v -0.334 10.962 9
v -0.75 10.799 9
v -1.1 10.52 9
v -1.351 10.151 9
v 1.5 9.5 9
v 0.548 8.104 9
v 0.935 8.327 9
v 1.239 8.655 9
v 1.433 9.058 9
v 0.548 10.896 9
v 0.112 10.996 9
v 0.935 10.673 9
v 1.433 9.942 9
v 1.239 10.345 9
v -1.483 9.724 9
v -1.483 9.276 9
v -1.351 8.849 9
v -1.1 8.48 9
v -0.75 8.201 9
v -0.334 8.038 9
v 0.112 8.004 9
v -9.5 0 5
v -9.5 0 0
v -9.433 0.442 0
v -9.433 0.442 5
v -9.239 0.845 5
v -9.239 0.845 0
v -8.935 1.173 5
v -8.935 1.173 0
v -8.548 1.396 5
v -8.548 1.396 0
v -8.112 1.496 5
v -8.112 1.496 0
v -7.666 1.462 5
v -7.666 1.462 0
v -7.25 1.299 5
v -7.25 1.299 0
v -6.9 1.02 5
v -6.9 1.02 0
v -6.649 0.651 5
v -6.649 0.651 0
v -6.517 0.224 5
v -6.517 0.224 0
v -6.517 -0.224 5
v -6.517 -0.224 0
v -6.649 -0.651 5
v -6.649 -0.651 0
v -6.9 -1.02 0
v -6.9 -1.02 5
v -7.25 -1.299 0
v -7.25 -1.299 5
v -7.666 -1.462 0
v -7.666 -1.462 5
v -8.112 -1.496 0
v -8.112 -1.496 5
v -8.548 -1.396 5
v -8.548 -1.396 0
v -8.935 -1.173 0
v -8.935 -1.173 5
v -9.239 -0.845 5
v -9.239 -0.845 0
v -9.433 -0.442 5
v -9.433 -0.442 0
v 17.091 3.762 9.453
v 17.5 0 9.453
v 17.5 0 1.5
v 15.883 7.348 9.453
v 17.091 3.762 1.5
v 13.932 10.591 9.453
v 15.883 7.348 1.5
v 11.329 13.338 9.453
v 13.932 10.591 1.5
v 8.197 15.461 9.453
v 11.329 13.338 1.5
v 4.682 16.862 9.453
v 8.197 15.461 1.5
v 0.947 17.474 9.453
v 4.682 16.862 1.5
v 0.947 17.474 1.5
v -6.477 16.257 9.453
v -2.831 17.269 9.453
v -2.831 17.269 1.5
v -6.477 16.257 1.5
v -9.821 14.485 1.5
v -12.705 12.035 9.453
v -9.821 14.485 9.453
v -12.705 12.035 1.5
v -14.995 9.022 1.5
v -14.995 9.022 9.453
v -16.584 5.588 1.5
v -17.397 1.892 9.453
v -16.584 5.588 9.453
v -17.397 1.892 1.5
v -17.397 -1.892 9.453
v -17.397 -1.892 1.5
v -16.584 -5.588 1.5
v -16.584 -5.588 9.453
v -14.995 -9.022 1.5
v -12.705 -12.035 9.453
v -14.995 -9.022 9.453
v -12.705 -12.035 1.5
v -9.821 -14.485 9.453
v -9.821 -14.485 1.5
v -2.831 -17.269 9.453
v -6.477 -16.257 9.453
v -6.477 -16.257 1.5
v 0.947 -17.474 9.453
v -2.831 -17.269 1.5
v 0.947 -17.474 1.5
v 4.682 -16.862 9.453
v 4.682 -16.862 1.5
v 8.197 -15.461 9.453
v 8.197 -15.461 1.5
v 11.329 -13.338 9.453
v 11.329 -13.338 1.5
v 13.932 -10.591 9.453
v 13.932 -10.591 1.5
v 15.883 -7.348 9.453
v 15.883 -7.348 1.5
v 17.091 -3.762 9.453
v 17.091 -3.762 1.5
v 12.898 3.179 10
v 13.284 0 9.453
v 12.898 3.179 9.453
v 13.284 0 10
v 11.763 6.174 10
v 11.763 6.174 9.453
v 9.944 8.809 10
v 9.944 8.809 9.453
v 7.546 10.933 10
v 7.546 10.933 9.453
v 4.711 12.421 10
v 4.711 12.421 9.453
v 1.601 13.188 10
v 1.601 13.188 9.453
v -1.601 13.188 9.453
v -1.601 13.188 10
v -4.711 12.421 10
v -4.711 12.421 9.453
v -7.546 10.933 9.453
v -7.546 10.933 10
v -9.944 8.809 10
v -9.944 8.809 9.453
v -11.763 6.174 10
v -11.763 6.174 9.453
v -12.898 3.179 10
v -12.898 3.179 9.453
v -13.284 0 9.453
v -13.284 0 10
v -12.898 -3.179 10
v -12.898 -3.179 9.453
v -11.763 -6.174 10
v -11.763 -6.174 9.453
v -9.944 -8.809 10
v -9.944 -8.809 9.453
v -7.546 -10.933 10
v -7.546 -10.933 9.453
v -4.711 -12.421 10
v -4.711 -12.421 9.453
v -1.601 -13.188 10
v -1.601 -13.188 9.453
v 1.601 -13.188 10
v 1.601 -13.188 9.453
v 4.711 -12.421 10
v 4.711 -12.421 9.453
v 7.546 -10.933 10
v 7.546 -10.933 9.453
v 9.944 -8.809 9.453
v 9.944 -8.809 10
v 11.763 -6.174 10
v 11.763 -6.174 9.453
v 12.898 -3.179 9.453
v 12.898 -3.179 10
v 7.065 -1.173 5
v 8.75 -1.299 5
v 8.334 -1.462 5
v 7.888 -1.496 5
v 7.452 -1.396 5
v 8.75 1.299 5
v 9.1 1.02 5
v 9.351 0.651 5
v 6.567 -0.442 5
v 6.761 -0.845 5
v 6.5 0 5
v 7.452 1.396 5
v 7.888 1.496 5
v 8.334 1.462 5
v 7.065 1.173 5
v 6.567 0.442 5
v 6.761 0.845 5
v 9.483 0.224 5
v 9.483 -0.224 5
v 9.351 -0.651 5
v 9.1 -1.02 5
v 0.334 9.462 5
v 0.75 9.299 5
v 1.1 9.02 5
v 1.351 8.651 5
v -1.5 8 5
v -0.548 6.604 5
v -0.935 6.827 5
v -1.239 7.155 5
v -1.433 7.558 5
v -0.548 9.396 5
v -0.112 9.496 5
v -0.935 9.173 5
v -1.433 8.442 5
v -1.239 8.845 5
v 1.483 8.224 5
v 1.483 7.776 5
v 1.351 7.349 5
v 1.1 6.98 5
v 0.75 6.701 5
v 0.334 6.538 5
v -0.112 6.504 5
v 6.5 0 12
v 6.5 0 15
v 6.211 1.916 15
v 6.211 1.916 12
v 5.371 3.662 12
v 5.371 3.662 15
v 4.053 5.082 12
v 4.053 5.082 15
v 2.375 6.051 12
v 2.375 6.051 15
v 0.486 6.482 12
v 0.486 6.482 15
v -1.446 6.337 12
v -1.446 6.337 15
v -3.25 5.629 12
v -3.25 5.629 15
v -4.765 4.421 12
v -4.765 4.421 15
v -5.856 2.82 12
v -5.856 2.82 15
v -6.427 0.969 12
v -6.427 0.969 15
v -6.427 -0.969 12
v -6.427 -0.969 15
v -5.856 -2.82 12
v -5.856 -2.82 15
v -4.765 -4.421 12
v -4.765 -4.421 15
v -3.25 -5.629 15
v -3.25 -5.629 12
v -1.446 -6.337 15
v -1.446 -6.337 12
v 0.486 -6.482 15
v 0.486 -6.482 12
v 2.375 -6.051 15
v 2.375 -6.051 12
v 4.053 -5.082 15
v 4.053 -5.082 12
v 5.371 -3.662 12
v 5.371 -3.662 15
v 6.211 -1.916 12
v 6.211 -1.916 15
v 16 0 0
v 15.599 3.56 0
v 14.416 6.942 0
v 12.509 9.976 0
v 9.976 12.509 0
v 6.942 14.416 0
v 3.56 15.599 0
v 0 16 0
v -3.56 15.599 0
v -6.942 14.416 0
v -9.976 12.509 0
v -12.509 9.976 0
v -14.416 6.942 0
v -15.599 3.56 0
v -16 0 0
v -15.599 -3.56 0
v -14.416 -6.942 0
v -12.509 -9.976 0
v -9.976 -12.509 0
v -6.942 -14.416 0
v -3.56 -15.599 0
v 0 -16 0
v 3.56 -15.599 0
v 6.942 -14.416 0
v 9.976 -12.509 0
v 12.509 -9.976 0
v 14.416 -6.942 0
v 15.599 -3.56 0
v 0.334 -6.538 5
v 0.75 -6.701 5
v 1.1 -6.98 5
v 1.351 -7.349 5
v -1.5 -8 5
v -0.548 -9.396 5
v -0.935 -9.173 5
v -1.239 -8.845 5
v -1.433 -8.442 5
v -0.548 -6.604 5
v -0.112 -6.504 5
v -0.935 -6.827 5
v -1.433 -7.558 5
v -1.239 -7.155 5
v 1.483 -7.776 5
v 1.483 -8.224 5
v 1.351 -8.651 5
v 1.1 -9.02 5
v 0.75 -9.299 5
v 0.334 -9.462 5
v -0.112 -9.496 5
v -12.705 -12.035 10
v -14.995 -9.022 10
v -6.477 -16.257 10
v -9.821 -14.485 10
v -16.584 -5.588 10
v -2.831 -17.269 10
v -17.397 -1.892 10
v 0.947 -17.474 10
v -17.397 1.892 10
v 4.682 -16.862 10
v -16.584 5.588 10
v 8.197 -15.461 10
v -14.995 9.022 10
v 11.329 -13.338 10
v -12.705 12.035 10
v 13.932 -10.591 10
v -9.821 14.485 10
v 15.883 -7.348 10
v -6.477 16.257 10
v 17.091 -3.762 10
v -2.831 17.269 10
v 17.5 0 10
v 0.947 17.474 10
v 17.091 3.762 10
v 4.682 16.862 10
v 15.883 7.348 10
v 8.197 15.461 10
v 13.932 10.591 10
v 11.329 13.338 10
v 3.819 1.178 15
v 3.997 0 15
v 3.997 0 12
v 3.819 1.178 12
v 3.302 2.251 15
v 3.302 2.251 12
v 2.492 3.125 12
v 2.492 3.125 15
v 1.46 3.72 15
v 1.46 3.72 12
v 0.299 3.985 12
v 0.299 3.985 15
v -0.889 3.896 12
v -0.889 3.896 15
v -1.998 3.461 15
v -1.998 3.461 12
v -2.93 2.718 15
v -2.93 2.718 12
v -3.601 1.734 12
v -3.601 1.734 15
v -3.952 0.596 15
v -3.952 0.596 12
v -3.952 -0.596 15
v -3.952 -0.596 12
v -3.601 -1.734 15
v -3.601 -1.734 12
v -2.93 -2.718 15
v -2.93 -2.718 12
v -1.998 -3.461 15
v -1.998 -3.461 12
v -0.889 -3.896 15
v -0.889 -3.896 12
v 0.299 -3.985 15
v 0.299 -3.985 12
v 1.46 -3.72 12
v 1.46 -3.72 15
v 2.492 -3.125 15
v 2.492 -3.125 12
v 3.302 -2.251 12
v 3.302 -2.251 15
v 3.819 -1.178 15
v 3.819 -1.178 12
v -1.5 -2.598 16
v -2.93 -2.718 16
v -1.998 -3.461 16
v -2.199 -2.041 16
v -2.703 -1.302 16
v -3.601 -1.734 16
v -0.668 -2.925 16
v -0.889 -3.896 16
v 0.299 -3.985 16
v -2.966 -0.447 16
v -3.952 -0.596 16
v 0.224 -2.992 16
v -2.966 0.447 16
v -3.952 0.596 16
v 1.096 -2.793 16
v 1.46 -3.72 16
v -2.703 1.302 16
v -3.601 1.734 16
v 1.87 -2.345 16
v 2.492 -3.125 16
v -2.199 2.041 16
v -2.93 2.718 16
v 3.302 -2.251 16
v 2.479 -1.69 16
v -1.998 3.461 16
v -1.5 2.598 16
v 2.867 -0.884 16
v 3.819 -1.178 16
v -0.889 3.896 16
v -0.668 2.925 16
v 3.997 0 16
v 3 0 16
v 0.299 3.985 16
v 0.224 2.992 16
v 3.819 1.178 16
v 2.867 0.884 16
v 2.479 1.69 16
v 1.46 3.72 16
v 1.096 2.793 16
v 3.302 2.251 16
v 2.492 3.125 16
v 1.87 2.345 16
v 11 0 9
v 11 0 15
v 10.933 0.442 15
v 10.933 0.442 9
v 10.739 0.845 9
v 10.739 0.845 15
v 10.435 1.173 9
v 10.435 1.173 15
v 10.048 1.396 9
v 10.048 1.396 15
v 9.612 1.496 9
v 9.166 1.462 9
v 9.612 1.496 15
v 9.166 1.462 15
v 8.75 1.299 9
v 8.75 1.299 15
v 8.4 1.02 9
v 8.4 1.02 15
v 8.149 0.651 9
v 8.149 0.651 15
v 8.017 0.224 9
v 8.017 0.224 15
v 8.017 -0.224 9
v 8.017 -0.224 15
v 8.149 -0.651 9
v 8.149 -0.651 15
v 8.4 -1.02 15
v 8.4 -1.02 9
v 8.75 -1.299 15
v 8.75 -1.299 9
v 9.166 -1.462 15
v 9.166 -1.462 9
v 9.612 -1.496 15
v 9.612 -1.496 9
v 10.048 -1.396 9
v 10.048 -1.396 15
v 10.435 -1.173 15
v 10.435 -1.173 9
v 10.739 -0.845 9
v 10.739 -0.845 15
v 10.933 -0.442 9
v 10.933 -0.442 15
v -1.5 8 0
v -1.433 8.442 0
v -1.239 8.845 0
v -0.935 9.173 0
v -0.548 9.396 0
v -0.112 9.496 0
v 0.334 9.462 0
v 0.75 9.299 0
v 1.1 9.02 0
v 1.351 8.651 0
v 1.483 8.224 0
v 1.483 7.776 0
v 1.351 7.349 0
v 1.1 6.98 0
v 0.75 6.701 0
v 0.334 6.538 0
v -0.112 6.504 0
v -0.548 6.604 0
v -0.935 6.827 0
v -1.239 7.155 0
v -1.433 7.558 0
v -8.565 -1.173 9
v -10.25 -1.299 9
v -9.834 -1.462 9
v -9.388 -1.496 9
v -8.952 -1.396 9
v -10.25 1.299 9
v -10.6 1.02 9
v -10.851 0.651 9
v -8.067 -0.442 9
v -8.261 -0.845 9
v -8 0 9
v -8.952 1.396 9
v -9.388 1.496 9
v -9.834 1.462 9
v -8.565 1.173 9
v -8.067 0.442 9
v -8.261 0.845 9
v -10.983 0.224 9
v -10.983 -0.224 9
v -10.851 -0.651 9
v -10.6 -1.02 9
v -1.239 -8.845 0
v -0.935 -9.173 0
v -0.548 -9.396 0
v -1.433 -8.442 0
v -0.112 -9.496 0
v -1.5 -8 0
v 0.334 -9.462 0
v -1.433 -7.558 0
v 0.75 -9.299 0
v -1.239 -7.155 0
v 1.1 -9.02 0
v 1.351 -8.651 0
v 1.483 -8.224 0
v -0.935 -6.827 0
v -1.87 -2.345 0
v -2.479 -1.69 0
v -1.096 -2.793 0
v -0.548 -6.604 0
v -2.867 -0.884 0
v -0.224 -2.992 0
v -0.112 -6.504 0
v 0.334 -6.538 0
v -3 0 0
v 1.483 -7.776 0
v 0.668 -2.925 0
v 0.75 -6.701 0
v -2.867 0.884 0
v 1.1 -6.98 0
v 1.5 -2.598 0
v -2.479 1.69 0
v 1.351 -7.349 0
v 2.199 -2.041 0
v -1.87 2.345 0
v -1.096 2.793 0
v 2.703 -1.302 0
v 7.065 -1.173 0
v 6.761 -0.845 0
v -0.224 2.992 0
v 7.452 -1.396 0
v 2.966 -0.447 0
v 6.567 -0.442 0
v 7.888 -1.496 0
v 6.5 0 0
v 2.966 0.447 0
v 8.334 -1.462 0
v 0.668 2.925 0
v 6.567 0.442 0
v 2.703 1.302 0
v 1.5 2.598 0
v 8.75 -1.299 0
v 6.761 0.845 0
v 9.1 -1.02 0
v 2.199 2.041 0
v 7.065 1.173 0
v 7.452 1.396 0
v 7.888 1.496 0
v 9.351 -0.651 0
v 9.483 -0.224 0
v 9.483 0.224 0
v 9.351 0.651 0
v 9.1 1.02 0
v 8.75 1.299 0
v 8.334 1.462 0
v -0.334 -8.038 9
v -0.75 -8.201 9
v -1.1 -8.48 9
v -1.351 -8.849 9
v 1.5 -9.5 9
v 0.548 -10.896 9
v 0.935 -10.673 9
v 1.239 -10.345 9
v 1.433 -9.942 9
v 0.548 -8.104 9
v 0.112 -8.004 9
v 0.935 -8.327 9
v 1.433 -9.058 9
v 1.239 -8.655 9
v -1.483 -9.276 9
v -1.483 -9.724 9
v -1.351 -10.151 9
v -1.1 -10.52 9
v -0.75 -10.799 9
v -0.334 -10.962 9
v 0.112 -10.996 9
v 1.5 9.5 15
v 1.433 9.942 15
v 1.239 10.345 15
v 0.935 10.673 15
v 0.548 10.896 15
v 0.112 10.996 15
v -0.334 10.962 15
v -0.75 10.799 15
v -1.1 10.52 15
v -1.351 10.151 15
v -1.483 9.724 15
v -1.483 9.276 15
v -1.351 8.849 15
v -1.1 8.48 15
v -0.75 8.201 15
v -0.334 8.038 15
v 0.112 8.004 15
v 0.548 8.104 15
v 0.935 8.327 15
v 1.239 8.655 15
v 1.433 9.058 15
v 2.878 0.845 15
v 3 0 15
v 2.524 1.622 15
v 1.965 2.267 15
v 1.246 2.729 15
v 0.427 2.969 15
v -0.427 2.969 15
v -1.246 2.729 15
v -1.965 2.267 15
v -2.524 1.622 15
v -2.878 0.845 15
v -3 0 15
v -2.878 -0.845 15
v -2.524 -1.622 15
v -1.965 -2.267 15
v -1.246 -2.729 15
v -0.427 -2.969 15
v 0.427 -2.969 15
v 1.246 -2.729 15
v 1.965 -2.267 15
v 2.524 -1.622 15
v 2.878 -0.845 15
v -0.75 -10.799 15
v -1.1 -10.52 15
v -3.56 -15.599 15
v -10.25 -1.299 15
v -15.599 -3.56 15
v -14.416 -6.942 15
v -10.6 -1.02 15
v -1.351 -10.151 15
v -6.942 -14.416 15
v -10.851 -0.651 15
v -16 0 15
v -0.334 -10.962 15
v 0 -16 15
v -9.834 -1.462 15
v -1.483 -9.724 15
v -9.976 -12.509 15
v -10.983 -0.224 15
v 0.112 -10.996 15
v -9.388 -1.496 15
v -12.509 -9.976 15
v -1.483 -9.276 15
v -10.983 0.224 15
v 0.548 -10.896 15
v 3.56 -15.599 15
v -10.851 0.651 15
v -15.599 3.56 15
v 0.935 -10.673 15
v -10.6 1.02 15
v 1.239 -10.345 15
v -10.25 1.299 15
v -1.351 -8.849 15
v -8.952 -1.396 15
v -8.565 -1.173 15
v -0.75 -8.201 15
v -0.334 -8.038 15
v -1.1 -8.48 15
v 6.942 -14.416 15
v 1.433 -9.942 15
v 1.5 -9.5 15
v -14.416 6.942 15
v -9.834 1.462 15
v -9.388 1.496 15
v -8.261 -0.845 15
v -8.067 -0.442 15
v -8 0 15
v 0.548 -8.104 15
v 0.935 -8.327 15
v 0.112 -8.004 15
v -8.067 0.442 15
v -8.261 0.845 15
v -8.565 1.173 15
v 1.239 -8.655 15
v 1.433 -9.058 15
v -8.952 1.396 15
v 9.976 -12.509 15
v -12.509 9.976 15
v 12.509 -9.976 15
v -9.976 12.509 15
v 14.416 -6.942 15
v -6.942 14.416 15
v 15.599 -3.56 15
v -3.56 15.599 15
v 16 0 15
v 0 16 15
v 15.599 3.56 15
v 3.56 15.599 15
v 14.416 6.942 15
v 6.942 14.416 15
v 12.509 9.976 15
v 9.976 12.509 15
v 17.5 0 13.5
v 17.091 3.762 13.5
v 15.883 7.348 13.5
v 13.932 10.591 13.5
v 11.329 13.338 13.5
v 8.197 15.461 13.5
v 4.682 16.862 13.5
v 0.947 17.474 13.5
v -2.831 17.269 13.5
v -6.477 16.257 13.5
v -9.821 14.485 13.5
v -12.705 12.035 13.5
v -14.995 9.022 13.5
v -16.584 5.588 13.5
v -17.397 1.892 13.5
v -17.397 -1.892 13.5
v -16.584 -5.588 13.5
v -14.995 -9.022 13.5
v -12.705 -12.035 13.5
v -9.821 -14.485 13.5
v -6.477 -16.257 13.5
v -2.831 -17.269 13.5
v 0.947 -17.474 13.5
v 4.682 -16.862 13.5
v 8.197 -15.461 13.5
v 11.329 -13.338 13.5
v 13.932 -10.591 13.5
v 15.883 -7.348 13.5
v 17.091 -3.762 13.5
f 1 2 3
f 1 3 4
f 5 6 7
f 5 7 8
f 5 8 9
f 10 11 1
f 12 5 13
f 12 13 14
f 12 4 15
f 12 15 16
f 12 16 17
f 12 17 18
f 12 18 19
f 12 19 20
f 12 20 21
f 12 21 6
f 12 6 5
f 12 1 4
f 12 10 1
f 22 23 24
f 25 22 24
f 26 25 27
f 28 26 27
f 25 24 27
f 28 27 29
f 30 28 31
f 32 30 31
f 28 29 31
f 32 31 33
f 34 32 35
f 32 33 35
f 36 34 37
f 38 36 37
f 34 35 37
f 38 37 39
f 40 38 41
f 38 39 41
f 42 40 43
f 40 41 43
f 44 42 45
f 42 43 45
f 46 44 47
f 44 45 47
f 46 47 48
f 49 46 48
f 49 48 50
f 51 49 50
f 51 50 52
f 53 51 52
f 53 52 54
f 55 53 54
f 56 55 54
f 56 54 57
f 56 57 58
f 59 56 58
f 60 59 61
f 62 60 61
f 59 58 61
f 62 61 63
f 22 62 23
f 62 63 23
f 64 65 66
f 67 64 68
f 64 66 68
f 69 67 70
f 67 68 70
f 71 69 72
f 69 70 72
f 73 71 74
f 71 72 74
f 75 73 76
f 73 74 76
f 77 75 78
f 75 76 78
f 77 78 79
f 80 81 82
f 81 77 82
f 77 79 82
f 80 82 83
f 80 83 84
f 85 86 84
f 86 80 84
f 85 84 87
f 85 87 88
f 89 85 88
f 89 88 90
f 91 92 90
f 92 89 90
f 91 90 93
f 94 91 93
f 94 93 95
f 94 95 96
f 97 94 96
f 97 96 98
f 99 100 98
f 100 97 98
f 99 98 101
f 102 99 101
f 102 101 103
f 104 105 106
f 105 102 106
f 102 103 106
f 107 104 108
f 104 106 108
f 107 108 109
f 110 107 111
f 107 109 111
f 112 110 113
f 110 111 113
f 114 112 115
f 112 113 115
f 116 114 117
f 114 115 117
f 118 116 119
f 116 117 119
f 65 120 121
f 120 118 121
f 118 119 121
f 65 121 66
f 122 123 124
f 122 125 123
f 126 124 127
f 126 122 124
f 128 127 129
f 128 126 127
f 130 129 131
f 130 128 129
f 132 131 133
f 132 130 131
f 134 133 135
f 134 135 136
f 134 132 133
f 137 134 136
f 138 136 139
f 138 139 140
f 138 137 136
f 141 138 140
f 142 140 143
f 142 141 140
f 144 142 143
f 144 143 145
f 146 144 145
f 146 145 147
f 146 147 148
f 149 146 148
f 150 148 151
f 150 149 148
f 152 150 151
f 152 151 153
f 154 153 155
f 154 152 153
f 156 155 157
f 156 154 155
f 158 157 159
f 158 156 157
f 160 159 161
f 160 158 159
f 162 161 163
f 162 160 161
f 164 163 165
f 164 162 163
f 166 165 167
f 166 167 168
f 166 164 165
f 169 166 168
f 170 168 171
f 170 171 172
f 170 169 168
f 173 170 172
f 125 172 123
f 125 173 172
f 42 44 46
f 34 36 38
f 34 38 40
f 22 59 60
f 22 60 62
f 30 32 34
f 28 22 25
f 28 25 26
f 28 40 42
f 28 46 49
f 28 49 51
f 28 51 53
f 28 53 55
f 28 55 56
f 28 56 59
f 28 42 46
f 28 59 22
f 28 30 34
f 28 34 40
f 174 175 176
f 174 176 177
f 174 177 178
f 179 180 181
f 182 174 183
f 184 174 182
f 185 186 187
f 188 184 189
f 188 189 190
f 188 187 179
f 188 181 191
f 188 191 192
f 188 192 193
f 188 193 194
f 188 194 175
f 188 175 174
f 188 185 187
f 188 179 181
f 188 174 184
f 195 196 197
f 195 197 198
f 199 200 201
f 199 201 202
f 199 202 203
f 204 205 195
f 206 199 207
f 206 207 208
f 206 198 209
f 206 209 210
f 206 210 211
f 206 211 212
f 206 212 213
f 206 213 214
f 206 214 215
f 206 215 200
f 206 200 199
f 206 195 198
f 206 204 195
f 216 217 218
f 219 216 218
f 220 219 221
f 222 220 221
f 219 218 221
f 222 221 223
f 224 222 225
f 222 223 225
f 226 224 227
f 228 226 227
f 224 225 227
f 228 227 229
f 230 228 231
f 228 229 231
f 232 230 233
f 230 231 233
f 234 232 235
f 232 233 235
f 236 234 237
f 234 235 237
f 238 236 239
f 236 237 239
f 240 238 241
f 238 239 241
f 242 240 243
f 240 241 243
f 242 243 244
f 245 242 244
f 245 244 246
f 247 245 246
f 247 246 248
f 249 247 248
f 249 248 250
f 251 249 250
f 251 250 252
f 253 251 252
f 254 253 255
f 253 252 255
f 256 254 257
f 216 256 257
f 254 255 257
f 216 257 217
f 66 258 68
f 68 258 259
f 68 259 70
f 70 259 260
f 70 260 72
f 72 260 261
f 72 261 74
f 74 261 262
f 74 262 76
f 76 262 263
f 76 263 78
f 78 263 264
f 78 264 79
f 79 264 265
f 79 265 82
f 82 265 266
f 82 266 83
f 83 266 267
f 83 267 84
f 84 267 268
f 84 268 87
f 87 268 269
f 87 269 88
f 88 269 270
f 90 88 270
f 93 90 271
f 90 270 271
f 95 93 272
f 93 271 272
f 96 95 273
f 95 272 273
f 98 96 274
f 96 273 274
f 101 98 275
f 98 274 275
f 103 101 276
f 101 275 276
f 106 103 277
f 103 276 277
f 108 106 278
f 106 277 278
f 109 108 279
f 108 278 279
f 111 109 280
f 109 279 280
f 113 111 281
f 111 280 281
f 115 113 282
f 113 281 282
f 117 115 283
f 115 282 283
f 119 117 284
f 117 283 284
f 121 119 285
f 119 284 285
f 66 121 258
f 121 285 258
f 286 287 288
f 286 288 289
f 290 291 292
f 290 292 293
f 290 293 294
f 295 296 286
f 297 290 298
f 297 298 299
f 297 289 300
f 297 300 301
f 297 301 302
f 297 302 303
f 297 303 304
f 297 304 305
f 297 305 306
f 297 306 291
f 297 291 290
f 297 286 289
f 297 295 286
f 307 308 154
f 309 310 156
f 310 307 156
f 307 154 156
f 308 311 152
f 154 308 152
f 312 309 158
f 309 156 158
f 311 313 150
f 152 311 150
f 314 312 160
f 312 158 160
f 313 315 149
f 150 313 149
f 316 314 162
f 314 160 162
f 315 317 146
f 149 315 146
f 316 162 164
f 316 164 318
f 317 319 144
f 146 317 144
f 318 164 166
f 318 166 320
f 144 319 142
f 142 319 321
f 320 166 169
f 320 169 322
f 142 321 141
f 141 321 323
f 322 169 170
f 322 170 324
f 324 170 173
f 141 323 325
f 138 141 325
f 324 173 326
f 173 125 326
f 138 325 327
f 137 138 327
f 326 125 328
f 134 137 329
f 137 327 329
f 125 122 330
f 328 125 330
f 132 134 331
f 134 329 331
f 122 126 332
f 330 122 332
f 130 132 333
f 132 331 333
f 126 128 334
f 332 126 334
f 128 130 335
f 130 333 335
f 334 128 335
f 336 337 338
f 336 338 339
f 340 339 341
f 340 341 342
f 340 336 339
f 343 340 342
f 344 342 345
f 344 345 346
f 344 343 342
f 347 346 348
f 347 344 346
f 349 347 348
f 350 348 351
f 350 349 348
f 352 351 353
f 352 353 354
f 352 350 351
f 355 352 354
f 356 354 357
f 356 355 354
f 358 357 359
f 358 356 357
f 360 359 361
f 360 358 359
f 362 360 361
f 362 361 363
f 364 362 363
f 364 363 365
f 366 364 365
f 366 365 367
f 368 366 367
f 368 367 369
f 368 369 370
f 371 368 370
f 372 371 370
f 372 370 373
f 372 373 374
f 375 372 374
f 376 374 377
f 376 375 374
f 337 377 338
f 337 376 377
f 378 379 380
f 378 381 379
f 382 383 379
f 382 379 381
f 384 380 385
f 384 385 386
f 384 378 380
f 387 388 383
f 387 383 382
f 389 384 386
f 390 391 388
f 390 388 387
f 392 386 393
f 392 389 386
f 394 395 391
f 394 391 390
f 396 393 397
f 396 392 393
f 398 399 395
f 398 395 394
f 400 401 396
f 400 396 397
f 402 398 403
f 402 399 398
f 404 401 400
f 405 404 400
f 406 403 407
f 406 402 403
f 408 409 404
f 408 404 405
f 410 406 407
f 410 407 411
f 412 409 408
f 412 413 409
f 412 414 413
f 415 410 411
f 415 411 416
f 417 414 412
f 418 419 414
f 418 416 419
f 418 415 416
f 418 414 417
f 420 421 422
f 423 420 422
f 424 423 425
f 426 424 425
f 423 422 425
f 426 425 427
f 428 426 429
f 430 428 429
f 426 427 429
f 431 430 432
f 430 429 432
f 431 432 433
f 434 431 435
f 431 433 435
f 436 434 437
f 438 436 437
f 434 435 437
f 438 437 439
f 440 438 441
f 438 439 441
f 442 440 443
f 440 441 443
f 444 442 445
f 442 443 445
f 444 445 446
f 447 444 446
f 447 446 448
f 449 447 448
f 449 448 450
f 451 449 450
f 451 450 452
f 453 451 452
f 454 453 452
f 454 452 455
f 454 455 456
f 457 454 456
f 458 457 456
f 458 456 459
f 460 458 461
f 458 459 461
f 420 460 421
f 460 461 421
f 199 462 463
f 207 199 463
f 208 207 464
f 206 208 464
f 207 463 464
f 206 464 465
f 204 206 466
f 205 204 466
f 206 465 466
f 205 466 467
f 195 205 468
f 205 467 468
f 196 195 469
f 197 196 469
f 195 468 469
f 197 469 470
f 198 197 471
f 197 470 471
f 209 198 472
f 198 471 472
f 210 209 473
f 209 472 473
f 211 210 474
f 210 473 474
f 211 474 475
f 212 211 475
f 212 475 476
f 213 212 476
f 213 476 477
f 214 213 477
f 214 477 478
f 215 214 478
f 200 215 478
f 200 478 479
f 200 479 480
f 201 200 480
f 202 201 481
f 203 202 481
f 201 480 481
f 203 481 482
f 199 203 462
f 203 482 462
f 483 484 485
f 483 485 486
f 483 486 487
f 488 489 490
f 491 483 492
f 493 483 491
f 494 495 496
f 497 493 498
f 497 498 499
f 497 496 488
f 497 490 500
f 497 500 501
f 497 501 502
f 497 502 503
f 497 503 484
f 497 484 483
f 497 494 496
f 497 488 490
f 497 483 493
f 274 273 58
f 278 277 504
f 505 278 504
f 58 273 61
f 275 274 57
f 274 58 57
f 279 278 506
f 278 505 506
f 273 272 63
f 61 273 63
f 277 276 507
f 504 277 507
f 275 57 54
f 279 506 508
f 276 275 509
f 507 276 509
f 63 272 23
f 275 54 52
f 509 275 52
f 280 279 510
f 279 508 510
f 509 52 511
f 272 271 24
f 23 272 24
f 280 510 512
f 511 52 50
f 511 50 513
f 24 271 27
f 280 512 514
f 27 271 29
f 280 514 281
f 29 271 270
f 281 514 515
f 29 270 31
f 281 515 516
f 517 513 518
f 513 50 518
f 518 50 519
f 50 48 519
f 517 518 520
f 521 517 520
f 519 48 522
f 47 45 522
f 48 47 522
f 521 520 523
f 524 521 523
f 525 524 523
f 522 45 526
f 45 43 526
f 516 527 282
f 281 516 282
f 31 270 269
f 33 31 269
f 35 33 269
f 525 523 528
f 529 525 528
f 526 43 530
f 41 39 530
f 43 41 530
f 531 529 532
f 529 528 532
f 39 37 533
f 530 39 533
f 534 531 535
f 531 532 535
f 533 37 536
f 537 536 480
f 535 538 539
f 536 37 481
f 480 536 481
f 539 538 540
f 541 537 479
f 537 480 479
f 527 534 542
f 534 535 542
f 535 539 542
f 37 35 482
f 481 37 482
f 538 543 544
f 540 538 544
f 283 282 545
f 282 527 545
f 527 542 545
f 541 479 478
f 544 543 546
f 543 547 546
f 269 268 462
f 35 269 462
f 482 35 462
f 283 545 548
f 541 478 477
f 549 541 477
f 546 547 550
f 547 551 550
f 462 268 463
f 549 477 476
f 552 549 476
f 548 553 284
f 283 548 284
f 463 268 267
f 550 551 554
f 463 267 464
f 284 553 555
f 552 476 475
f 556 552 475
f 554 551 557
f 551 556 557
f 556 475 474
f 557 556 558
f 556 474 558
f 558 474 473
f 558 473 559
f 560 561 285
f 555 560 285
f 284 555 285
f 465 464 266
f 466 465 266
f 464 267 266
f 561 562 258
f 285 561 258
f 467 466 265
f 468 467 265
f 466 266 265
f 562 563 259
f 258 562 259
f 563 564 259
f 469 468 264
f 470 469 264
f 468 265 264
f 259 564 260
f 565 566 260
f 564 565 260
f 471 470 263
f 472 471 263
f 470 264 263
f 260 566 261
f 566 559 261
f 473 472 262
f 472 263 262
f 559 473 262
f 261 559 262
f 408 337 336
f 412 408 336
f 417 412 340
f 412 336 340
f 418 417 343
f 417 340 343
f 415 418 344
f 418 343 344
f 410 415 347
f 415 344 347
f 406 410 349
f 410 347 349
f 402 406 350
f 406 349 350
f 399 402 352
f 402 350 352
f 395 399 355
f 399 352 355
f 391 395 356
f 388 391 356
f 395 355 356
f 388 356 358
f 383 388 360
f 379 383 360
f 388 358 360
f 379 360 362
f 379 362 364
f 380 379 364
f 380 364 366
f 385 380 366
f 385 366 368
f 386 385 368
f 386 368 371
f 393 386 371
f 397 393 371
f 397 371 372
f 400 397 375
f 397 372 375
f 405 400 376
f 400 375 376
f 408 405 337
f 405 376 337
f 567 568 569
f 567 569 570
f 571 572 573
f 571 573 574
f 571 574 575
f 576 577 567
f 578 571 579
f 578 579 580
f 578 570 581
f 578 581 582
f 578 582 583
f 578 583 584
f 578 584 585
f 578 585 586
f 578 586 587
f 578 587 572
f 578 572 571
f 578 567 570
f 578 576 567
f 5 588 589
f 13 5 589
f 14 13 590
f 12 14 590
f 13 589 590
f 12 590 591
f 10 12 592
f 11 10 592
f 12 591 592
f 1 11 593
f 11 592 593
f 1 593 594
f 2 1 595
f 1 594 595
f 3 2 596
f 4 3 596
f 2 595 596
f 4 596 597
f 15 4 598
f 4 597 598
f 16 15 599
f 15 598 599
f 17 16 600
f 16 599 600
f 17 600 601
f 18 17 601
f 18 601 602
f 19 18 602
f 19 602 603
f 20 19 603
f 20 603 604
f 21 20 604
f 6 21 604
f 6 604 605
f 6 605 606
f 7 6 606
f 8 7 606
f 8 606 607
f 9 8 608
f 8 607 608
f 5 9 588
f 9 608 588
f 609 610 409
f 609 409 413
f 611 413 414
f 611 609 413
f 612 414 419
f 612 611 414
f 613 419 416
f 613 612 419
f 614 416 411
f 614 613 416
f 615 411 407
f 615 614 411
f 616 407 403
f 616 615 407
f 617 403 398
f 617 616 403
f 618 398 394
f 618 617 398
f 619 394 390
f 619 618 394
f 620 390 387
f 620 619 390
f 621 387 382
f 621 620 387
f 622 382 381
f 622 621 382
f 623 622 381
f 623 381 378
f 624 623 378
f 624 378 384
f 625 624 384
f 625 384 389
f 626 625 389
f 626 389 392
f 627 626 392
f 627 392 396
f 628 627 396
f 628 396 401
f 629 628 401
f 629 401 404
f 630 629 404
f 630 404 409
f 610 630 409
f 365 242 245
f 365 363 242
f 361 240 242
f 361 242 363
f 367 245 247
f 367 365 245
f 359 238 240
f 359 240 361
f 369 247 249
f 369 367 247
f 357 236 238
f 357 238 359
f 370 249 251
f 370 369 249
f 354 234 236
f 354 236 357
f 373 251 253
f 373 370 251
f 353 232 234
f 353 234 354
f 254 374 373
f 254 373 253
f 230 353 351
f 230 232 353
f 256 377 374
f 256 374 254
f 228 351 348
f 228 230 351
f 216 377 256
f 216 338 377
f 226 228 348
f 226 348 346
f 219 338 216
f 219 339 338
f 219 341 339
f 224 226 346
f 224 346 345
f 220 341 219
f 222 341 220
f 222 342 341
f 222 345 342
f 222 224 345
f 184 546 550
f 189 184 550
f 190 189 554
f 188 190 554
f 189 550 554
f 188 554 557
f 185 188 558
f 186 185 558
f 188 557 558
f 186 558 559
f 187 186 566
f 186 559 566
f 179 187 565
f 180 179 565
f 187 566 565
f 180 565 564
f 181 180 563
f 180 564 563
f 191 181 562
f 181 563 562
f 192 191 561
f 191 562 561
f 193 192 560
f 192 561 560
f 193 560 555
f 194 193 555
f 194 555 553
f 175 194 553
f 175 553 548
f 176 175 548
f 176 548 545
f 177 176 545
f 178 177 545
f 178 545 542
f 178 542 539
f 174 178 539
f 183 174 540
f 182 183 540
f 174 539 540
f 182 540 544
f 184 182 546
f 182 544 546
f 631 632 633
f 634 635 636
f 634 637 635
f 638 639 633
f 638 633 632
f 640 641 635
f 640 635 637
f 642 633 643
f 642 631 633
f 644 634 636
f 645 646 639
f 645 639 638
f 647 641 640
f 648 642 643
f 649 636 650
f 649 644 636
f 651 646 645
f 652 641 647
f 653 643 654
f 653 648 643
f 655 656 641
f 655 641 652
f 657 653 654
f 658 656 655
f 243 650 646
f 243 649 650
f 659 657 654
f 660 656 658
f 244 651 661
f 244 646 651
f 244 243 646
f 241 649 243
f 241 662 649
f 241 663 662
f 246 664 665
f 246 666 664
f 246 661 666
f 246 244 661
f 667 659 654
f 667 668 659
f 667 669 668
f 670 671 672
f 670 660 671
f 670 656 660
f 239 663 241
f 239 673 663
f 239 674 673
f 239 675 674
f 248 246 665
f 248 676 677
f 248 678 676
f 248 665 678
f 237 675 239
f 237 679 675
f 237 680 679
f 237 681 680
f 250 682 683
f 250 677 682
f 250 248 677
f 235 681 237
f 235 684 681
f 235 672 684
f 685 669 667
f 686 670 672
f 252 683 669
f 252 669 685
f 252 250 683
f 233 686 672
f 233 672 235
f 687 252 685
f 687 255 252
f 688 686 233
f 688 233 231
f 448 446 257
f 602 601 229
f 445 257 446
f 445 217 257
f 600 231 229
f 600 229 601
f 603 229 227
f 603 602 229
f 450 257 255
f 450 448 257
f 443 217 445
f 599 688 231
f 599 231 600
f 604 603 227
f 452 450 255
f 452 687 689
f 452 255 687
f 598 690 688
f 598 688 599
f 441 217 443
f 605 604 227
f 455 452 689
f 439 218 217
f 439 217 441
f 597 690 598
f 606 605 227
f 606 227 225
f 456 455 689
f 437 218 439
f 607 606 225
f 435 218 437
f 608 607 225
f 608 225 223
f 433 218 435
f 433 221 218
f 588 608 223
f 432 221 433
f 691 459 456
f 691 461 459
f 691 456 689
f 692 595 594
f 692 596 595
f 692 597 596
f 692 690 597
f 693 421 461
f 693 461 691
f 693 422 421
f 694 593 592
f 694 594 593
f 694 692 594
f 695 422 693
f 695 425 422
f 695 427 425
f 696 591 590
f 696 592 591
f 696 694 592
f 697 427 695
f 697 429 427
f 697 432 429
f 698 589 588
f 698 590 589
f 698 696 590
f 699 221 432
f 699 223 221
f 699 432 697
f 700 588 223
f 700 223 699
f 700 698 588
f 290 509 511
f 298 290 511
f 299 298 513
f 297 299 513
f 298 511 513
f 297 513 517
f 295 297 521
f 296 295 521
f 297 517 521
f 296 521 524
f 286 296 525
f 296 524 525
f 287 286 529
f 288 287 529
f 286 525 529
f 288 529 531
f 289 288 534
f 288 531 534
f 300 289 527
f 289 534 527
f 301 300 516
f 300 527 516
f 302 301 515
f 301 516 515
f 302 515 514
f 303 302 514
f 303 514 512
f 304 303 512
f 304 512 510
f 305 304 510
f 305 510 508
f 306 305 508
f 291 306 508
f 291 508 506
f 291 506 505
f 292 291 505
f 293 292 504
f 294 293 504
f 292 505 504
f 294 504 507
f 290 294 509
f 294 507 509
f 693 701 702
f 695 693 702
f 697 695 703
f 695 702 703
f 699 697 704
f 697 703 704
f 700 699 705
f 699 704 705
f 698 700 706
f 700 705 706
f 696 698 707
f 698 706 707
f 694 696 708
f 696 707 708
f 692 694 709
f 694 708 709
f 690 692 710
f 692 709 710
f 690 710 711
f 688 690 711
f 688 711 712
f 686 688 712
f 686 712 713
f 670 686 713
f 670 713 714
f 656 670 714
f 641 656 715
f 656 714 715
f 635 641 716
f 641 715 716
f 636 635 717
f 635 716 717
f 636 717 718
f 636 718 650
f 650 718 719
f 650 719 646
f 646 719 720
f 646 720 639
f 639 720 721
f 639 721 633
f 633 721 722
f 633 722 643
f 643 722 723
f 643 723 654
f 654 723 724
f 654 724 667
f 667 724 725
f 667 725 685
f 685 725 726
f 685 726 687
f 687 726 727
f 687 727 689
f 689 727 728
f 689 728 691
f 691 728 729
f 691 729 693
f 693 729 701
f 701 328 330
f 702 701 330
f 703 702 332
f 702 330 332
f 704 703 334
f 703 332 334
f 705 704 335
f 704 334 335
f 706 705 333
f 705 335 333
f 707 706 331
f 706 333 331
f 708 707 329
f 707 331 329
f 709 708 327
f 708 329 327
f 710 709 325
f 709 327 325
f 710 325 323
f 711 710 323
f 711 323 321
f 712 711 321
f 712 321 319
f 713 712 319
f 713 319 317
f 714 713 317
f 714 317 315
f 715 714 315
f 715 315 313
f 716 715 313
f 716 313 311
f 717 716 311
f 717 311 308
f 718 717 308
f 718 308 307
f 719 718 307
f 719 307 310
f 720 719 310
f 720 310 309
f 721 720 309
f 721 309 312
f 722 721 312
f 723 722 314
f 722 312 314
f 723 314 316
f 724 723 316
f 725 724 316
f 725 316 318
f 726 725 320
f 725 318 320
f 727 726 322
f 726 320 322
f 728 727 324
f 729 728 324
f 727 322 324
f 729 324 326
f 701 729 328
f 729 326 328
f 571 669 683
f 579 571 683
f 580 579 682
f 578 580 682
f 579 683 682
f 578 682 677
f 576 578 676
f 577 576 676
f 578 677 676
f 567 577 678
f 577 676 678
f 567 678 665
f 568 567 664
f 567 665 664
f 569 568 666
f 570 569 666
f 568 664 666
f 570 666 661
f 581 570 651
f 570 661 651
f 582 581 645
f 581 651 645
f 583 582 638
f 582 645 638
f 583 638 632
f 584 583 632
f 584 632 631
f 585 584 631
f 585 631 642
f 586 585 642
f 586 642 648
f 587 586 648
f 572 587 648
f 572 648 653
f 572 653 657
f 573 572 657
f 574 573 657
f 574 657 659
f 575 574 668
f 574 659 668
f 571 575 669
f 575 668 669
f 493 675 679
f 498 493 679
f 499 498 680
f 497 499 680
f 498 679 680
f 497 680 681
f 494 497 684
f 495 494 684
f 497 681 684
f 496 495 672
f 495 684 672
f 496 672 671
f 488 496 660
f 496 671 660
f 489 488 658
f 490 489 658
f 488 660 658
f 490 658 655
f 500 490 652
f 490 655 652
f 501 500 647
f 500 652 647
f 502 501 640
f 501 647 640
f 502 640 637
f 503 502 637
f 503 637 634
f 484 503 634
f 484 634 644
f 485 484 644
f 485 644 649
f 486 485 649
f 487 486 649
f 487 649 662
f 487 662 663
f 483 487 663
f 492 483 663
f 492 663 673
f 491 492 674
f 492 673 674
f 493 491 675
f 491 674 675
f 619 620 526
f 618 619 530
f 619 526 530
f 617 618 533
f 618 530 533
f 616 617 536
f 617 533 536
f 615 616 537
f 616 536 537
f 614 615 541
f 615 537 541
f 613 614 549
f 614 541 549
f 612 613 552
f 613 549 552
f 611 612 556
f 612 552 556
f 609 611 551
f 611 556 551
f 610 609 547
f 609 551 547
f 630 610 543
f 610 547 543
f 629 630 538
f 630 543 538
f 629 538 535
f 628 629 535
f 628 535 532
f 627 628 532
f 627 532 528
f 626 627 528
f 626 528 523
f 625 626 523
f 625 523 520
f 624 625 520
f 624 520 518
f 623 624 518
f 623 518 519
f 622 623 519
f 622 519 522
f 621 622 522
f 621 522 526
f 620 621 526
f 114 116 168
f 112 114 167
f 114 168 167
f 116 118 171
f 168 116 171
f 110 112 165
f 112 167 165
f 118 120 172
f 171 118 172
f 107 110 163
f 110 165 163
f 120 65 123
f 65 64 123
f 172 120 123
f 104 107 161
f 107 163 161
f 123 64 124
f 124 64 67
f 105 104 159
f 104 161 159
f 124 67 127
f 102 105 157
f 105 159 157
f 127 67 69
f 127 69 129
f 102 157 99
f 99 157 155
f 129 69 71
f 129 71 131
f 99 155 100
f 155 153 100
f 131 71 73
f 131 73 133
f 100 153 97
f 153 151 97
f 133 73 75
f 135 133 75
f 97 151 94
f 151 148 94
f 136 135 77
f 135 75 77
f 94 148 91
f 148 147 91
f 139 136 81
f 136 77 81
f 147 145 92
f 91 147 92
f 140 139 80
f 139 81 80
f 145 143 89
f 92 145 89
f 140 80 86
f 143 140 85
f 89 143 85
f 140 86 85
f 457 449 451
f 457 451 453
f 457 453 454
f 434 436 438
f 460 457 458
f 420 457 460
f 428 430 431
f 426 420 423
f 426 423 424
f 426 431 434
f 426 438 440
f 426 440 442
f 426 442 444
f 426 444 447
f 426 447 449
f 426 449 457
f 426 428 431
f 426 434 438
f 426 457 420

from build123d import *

# Parameters (mm, degrees)
SKETCH_1_R          = 17.5
EXTRUDE_1_DEPTH     = 15
SKETCH_2_R          = 1.5
CUT_EXTRUDE_1_DEPTH = 5
SKETCH_4_R          = 3
CUT_EXTRUDE_2_DEPTH = 20
SKETCH_5_R          = 1.5
CUT_EXTRUDE_3_DEPTH = 6
CHAMFER_1_SIZE      = 1.5
SKETCH_6_R          = 6.5
SKETCH_6_R_2        = 3.996615851
CUT_EXTRUDE_4_DEPTH = 3
SKETCH_7_R          = 3.996615851
SKETCH_7_R_2        = 3
EXTRUDE_2_DEPTH     = 1


with BuildPart() as part:
    # 草图1 → 凸台-拉伸1 (new body)
    with BuildSketch(Plane.XY):
        Circle(SKETCH_1_R)
    extrude(amount=EXTRUDE_1_DEPTH)

    # 草图2 → 切除-拉伸1 (cut)
    with BuildSketch(Plane(origin=(0, 0, 0), x_dir=(-1, 0, 0), z_dir=(0, 0, -1))):
        with Locations((0, -8)):
            Circle(SKETCH_2_R)
        with Locations((-8, 0)):
            Circle(SKETCH_2_R)
        with Locations((0, 8)):
            Circle(SKETCH_2_R)
        with Locations((8, 0)):
            Circle(SKETCH_2_R)
    extrude(amount=-CUT_EXTRUDE_1_DEPTH, mode=Mode.SUBTRACT)

    # 草图3 → 切除-旋转1 (revolve, cut)
    with BuildSketch(Plane(origin=(0, 0, 0), x_dir=(1, 0, 0), z_dir=(0, 1, 0))):
        Polygon((13.284433797, -10), (13.284433797, -9.953144571), (13.284433797, -9.453144571), (17.969347124, -9.453144571), (17.969347124, -10), align=None)
    revolve(axis=Axis((0, 0, 0), (0, 0, 1)), mode=Mode.SUBTRACT)

    # 草图4 → 切除-拉伸2 (cut)
    with BuildSketch(Plane(origin=(0, 0, 0), x_dir=(-1, 0, 0), z_dir=(0, 0, -1))):
        Circle(SKETCH_4_R)
    extrude(amount=-CUT_EXTRUDE_2_DEPTH, mode=Mode.SUBTRACT)

    # 草图5 → 切除-拉伸3 (cut)
    with BuildSketch(Plane.XY.offset(15)):
        with Locations((0, -9.5)):
            Circle(SKETCH_5_R)
        with Locations((-9.5, 0)):
            Circle(SKETCH_5_R)
        with Locations((0, 9.5)):
            Circle(SKETCH_5_R)
        with Locations((9.5, 0)):
            Circle(SKETCH_5_R)
    extrude(amount=-CUT_EXTRUDE_3_DEPTH, mode=Mode.SUBTRACT)

    # 倒角1
    chamfer_1_edges = [part.edges().sort_by_distance(p)[0] for p in [
        (-17.5, 0, 0),
        (-17.5, 0, 15),
    ]]
    chamfer(chamfer_1_edges, length=CHAMFER_1_SIZE)

    # 草图6 → 切除-拉伸4 (cut)
    with BuildSketch(Plane.XY.offset(15)):
        Circle(SKETCH_6_R)
        Circle(SKETCH_6_R_2, mode=Mode.SUBTRACT)
    extrude(amount=-CUT_EXTRUDE_4_DEPTH, mode=Mode.SUBTRACT)

    # 草图7 → 凸台-拉伸2 (add)
    with BuildSketch(Plane.XY.offset(15)):
        Circle(SKETCH_7_R)
        Circle(SKETCH_7_R_2, mode=Mode.SUBTRACT)
    extrude(amount=EXTRUDE_2_DEPTH)


solid = part.part
